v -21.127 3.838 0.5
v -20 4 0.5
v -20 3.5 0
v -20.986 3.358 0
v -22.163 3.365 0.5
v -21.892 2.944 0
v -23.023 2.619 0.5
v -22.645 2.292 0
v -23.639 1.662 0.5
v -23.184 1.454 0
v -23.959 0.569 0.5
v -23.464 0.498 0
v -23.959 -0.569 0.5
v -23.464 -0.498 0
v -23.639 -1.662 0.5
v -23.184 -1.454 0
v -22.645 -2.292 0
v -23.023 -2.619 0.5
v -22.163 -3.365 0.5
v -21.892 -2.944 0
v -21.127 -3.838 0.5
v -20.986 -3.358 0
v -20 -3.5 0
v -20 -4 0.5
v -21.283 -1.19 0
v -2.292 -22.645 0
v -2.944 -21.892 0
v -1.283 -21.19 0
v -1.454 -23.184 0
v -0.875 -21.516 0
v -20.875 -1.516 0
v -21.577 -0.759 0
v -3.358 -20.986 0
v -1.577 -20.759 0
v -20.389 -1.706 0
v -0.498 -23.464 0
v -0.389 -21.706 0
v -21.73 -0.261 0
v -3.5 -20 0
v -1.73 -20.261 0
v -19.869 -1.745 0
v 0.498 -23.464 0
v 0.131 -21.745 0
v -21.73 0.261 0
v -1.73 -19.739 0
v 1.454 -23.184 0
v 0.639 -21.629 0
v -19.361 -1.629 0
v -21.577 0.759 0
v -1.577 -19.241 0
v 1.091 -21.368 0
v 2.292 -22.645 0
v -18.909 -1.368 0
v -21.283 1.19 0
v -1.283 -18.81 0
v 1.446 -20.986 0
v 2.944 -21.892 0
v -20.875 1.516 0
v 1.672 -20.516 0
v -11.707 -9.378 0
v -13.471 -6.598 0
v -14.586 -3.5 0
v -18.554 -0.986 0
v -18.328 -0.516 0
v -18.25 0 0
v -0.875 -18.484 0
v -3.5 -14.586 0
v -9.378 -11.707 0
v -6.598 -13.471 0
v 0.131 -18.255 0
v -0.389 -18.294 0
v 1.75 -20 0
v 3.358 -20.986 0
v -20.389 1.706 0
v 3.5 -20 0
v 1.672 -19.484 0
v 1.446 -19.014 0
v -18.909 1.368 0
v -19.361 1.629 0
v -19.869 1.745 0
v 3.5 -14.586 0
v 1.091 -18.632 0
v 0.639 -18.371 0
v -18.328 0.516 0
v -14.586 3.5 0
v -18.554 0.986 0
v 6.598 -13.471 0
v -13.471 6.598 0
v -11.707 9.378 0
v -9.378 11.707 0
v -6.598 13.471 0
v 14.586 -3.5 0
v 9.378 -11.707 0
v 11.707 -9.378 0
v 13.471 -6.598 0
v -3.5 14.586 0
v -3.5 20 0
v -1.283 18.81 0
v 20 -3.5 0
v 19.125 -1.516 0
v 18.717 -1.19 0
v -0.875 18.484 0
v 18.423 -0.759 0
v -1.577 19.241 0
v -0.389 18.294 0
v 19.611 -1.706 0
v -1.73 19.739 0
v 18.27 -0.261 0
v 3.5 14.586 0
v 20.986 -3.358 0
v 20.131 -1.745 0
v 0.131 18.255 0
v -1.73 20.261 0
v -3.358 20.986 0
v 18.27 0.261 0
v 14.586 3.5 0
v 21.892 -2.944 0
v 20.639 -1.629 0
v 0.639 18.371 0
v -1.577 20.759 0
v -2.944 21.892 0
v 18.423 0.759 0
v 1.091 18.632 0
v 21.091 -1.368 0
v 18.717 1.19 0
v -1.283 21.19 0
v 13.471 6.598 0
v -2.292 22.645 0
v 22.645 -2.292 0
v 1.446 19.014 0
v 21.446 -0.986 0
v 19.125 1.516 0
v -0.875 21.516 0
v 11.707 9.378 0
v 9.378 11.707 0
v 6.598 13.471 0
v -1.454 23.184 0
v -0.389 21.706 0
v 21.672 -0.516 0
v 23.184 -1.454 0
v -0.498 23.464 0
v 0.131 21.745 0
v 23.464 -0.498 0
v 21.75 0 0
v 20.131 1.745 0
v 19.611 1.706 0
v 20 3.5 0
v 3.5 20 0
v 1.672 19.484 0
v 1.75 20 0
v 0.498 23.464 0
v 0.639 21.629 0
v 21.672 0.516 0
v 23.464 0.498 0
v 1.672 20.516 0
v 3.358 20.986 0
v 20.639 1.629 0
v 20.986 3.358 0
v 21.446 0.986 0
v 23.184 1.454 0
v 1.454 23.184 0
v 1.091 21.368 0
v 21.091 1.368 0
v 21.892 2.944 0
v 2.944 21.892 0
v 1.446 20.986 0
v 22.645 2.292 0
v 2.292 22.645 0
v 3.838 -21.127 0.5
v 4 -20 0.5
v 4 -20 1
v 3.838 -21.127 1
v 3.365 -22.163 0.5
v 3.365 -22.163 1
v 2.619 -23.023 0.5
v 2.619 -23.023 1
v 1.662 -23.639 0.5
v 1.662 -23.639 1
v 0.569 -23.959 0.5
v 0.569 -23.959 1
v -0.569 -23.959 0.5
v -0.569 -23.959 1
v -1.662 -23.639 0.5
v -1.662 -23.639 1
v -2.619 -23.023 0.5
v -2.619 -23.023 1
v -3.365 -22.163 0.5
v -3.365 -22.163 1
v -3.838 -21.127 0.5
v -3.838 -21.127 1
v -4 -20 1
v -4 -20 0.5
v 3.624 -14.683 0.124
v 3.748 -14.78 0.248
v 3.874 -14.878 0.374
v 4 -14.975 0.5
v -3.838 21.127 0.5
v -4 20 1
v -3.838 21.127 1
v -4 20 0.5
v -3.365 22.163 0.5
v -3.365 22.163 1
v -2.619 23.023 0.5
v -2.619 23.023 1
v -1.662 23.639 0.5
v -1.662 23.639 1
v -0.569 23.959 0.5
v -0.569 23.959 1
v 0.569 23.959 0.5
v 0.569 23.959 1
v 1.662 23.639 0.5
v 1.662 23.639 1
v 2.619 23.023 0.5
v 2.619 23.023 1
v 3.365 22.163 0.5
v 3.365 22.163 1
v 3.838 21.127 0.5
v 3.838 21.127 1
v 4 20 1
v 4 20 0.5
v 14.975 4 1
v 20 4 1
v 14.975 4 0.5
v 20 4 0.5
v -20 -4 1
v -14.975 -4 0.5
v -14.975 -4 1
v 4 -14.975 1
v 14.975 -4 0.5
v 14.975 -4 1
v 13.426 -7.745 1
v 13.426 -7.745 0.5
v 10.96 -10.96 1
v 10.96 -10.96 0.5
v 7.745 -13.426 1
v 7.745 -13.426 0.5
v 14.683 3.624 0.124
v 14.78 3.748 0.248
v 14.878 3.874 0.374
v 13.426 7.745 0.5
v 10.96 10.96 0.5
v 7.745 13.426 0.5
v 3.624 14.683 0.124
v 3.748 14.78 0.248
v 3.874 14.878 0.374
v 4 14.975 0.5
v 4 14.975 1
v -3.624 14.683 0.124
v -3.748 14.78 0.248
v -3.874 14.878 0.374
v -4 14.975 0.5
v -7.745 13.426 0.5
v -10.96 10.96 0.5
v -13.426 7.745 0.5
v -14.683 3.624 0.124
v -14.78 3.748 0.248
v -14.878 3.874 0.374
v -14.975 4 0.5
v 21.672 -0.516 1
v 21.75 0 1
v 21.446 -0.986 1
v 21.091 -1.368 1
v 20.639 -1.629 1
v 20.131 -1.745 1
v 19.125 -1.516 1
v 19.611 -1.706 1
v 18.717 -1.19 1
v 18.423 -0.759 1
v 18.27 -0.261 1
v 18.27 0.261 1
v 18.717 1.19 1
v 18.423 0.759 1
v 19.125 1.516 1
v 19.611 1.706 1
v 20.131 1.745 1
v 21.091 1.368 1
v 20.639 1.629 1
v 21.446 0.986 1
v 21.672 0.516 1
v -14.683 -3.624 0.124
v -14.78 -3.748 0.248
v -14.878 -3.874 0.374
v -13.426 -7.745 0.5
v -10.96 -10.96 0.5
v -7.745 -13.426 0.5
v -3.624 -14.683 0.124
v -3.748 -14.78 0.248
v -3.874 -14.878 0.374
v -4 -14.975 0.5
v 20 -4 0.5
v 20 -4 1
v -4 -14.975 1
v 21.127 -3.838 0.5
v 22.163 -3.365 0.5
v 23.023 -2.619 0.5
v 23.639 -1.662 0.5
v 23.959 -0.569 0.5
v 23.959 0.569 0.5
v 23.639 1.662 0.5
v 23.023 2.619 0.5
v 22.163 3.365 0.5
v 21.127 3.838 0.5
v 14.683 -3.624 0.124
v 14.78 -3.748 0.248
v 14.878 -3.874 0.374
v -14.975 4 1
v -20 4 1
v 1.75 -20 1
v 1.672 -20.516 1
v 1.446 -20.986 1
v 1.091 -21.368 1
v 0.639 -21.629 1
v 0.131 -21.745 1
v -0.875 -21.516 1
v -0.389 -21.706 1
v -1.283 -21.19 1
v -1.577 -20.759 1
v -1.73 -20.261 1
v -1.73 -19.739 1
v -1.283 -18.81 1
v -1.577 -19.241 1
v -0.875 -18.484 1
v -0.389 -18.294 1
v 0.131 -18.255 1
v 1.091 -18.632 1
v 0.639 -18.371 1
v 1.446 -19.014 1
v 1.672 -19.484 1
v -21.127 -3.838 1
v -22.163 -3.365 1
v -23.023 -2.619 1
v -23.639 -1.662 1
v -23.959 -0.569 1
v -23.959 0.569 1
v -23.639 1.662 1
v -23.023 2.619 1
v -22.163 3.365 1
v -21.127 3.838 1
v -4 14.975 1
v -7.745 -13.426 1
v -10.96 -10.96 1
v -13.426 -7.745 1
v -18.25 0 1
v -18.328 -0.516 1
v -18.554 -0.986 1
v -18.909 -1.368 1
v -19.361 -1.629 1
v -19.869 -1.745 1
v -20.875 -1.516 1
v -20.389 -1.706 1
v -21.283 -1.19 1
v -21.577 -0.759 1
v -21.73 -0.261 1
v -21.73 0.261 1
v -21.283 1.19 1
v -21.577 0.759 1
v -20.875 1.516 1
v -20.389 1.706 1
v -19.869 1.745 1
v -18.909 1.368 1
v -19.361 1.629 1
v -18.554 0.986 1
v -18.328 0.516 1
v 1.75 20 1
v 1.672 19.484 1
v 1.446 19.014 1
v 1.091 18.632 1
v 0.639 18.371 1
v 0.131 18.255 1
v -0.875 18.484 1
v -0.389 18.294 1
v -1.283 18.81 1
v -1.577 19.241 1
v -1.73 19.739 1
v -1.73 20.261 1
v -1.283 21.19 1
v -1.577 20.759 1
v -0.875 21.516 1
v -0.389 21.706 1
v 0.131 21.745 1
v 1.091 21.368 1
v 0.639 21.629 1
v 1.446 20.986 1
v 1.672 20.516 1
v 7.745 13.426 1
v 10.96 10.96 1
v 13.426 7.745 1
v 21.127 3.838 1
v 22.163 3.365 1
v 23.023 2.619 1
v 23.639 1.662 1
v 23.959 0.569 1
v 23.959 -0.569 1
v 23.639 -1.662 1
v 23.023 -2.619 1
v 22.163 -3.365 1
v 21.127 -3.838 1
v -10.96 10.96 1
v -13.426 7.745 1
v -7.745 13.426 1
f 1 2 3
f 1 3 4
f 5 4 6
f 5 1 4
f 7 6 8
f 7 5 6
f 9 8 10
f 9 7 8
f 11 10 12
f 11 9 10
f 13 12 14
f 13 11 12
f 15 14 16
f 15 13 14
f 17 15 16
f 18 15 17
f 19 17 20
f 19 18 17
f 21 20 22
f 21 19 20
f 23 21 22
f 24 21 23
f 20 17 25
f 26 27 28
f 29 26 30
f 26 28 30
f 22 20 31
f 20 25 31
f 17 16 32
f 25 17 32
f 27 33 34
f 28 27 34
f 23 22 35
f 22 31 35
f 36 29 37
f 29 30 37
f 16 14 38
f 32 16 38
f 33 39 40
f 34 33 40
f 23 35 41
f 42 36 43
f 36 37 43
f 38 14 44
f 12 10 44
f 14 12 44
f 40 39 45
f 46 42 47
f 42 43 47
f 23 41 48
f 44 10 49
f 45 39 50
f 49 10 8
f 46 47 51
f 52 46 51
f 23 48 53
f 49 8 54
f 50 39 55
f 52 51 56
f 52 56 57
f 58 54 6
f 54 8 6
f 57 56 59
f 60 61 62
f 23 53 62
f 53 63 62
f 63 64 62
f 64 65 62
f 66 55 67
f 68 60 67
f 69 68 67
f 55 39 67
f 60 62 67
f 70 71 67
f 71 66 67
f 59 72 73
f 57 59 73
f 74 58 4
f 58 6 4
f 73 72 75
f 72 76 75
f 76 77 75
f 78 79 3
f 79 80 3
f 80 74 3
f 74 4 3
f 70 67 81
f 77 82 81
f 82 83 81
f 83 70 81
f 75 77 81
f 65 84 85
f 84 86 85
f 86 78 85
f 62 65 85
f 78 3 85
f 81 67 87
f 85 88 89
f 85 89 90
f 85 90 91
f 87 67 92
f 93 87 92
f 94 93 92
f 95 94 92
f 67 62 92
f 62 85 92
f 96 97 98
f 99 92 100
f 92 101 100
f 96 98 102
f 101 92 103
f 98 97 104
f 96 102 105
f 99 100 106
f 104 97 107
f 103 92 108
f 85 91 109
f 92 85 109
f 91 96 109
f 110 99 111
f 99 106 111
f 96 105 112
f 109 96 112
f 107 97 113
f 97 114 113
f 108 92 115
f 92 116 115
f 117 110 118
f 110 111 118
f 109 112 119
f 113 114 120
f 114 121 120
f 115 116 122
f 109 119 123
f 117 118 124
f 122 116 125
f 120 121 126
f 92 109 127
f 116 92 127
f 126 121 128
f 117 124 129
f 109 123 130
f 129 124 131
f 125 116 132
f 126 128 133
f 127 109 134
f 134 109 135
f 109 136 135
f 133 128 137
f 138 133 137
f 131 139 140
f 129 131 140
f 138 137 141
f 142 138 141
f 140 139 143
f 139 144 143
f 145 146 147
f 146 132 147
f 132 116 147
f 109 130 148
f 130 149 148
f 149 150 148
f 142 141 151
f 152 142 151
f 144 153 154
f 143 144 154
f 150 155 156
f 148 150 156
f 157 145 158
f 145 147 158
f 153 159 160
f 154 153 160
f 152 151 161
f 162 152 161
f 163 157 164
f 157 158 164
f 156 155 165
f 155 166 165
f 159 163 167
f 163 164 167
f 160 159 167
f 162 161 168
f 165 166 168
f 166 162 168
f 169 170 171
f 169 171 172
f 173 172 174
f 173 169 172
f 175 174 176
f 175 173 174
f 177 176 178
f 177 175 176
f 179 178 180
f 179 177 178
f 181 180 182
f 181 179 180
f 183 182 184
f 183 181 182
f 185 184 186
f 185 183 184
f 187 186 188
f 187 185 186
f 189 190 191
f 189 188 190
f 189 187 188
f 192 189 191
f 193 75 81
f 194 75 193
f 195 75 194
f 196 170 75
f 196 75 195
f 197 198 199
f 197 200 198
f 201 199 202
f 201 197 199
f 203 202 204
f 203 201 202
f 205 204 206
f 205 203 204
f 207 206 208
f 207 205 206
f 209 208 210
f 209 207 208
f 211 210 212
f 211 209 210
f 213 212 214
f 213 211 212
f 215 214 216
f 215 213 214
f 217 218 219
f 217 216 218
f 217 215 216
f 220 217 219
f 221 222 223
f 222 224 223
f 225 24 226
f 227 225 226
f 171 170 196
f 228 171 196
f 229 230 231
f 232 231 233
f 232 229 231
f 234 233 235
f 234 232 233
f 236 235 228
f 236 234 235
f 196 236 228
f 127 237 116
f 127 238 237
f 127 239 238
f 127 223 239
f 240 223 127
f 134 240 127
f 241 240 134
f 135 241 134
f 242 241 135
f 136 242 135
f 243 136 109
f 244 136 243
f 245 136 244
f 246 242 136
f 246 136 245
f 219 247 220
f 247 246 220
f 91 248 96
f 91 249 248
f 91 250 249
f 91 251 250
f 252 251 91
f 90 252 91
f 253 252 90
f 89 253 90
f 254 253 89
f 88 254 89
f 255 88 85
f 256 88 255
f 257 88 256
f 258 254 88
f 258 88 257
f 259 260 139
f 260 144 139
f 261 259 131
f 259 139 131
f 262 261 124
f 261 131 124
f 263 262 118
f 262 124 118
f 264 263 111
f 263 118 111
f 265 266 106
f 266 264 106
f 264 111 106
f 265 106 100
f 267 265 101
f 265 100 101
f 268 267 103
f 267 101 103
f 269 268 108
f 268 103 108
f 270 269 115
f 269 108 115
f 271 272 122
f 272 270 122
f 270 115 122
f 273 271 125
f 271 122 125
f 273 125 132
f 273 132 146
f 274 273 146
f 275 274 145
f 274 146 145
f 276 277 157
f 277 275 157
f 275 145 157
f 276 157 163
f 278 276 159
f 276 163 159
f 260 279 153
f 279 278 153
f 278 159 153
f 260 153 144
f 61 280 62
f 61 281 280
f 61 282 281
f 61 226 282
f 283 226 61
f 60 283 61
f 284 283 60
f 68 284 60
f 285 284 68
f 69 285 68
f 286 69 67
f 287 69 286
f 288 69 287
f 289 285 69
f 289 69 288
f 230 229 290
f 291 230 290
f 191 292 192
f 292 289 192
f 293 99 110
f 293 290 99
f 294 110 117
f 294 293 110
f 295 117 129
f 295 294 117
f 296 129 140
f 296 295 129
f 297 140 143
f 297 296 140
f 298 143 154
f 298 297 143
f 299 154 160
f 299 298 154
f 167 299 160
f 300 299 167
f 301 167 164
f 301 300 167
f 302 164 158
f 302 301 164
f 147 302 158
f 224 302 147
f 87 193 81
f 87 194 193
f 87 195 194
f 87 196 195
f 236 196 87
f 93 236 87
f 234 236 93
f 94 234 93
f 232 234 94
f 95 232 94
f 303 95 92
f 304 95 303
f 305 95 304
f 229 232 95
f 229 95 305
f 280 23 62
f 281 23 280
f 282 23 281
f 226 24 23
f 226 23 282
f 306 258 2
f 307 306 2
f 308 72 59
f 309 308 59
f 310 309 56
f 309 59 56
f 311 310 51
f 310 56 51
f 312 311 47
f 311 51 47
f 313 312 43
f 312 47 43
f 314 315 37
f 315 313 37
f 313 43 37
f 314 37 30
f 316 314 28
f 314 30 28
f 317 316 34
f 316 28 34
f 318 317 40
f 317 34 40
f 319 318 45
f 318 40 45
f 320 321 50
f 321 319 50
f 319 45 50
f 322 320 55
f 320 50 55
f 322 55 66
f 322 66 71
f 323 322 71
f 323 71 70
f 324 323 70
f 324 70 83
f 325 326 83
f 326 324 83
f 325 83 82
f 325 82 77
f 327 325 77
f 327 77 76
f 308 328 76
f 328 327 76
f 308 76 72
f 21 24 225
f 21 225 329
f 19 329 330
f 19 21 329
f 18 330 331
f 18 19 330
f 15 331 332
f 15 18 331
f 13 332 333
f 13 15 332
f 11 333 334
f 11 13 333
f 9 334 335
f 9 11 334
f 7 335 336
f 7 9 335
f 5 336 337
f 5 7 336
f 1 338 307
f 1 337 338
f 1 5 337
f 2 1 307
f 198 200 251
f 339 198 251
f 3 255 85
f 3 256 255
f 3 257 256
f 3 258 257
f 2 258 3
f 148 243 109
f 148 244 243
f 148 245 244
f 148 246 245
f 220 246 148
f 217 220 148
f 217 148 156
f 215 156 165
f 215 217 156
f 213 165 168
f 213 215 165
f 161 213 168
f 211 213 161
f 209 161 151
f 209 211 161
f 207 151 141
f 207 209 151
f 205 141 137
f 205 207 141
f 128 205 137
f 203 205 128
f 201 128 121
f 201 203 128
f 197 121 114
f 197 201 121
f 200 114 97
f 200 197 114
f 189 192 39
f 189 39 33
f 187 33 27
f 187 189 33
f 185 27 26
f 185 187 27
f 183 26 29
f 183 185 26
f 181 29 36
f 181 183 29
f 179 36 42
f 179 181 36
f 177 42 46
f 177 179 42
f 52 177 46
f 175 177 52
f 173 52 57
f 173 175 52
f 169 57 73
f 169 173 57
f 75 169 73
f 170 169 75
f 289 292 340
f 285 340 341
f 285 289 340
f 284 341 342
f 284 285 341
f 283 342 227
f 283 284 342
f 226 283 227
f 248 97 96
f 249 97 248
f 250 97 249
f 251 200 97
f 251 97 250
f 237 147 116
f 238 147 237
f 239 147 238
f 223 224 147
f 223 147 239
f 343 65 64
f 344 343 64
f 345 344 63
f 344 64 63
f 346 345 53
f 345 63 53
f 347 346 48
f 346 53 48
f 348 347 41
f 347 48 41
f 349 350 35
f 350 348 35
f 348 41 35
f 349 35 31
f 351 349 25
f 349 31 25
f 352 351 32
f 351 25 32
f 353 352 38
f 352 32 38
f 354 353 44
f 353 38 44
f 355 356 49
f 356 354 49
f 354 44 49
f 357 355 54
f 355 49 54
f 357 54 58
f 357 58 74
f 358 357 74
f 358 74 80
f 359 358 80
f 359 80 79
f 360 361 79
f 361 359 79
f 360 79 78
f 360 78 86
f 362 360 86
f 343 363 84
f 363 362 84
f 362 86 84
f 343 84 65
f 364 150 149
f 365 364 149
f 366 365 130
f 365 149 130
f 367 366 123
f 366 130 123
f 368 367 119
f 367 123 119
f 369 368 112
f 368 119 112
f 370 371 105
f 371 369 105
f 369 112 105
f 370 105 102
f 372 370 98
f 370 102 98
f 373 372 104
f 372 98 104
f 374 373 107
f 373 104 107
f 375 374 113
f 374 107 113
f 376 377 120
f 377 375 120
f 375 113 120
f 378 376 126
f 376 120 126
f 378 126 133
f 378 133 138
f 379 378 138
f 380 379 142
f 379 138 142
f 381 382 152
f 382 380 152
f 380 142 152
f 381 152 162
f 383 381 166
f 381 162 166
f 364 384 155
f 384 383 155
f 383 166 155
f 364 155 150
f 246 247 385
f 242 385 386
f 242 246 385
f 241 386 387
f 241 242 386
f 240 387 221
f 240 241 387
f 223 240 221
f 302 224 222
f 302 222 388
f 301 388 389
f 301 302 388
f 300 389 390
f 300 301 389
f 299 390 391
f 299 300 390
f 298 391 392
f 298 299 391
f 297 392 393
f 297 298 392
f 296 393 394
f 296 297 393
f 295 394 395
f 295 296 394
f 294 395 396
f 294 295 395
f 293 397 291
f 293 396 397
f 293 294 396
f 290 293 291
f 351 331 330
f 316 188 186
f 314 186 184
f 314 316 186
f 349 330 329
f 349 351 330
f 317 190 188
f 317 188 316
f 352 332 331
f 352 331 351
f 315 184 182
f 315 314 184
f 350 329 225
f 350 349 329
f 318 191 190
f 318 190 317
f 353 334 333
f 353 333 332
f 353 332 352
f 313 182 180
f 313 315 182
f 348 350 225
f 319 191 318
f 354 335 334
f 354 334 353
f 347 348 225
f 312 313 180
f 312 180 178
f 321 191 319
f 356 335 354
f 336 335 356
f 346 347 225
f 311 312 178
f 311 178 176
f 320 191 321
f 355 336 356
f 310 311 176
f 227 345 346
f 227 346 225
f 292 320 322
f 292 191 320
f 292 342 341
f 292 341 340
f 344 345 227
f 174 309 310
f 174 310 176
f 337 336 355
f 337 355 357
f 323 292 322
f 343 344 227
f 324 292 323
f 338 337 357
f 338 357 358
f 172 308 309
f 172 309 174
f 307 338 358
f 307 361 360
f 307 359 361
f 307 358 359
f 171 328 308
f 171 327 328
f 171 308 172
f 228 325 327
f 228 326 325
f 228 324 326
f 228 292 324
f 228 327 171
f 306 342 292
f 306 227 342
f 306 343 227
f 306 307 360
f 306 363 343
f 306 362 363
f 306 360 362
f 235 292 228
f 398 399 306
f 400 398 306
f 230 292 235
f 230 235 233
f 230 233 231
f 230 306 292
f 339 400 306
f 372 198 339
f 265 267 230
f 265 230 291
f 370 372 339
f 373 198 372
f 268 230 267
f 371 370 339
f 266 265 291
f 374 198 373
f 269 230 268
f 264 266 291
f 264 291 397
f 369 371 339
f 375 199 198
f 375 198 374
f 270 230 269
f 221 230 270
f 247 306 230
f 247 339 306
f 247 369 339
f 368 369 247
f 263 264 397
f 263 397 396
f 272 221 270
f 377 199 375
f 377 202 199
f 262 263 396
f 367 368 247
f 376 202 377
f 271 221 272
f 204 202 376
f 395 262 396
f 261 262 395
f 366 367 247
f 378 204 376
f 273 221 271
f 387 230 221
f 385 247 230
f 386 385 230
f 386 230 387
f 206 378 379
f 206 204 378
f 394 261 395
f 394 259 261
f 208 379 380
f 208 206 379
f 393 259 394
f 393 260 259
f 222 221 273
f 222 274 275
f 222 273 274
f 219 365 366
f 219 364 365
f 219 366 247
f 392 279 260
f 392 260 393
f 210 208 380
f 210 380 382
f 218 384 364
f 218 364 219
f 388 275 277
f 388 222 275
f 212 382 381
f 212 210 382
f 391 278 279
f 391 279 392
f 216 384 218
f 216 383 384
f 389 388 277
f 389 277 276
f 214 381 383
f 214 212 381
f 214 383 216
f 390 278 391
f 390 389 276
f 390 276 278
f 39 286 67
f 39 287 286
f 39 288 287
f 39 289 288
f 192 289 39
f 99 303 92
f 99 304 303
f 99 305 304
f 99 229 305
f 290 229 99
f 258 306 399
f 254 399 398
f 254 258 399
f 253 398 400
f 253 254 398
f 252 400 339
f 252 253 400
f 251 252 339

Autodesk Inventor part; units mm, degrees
ref_plane "YZ Plane" through (0, 0, 0) normal (1, 0, 0) x (0, 1, 0)
ref_plane "XZ Plane" through (0, 0, 0) normal (0, 1, 0) x (-1, 0, 0)
ref_plane "XY Plane" through (0, 0, 0) normal (0, 0, 1) x (1, 0, 0)
sketch "Sketch1" plane through (0, 0, 0) normal (0, 0, 1) x (1, 0, 0)
  circle A0 centre (0, 0) radius 15.5
  line L0 (-20, 0) -> (20, 0) construction
  line L1 (-20, -4) -> (20, -4)
  line L2 (20, 4) -> (-20, 4)
  arc A1 (-20, 4) -> (-20, -4) centre (-20, 0) ccw
  arc A2 (20, -4) -> (20, 4) centre (20, 0) ccw
  line L3 (0, -20) -> (0, 20) construction
  line L4 (4, -20) -> (4, 20)
  line L5 (-4, 20) -> (-4, -20)
  arc A3 (-4, -20) -> (4, -20) centre (0, -20) ccw
  arc A4 (4, 20) -> (-4, 20) centre (0, 20) ccw
  circle A5 centre (-20, 0) radius 1.75
  circle A6 centre (0, 20) radius 1.75
  circle A7 centre (20, 0) radius 1.75
  circle A8 centre (0, -20) radius 1.75
  point P0 (4, -14.975)
  point P1 (14.975, -4)
  point P2 (14.975, 4)
  point P3 (4, 14.975)
  point P4 (-4, 14.975)
  point P5 (-14.975, 4)
  point P6 (-14.975, -4)
  point P7 (-4, -14.975)
  dimension "d0" = 40
  dimension "d1" = 40
  dimension "d2" = 4
  dimension "d3" = 4
  dimension "d4" = 31
  dimension "d5" = 3.5
extrude "Extrusion1" add sketch "Sketch1" along normal blind 1
chamfer "Chamfer1" distance 0.5 angle 45 16 edges at (-10.9602, -10.9602, 0) (-4, -17.4875, 0) (0, -24, 0) (4, -17.4875, 0) (10.9602, -10.9602, 0) (17.4875, -4, 0) (24, 0, 0) (17.4875, 4, 0) (10.9602, 10.9602, 0) (4, 17.4875, 0) (0, 24, 0) (-4, 17.4875, 0) (-10.9602, 10.9602, 0) (-17.4875, 4, 0) (-24, 0, 0) (-17.4875, -4, 0)
properties part number "PlatformBracket"
